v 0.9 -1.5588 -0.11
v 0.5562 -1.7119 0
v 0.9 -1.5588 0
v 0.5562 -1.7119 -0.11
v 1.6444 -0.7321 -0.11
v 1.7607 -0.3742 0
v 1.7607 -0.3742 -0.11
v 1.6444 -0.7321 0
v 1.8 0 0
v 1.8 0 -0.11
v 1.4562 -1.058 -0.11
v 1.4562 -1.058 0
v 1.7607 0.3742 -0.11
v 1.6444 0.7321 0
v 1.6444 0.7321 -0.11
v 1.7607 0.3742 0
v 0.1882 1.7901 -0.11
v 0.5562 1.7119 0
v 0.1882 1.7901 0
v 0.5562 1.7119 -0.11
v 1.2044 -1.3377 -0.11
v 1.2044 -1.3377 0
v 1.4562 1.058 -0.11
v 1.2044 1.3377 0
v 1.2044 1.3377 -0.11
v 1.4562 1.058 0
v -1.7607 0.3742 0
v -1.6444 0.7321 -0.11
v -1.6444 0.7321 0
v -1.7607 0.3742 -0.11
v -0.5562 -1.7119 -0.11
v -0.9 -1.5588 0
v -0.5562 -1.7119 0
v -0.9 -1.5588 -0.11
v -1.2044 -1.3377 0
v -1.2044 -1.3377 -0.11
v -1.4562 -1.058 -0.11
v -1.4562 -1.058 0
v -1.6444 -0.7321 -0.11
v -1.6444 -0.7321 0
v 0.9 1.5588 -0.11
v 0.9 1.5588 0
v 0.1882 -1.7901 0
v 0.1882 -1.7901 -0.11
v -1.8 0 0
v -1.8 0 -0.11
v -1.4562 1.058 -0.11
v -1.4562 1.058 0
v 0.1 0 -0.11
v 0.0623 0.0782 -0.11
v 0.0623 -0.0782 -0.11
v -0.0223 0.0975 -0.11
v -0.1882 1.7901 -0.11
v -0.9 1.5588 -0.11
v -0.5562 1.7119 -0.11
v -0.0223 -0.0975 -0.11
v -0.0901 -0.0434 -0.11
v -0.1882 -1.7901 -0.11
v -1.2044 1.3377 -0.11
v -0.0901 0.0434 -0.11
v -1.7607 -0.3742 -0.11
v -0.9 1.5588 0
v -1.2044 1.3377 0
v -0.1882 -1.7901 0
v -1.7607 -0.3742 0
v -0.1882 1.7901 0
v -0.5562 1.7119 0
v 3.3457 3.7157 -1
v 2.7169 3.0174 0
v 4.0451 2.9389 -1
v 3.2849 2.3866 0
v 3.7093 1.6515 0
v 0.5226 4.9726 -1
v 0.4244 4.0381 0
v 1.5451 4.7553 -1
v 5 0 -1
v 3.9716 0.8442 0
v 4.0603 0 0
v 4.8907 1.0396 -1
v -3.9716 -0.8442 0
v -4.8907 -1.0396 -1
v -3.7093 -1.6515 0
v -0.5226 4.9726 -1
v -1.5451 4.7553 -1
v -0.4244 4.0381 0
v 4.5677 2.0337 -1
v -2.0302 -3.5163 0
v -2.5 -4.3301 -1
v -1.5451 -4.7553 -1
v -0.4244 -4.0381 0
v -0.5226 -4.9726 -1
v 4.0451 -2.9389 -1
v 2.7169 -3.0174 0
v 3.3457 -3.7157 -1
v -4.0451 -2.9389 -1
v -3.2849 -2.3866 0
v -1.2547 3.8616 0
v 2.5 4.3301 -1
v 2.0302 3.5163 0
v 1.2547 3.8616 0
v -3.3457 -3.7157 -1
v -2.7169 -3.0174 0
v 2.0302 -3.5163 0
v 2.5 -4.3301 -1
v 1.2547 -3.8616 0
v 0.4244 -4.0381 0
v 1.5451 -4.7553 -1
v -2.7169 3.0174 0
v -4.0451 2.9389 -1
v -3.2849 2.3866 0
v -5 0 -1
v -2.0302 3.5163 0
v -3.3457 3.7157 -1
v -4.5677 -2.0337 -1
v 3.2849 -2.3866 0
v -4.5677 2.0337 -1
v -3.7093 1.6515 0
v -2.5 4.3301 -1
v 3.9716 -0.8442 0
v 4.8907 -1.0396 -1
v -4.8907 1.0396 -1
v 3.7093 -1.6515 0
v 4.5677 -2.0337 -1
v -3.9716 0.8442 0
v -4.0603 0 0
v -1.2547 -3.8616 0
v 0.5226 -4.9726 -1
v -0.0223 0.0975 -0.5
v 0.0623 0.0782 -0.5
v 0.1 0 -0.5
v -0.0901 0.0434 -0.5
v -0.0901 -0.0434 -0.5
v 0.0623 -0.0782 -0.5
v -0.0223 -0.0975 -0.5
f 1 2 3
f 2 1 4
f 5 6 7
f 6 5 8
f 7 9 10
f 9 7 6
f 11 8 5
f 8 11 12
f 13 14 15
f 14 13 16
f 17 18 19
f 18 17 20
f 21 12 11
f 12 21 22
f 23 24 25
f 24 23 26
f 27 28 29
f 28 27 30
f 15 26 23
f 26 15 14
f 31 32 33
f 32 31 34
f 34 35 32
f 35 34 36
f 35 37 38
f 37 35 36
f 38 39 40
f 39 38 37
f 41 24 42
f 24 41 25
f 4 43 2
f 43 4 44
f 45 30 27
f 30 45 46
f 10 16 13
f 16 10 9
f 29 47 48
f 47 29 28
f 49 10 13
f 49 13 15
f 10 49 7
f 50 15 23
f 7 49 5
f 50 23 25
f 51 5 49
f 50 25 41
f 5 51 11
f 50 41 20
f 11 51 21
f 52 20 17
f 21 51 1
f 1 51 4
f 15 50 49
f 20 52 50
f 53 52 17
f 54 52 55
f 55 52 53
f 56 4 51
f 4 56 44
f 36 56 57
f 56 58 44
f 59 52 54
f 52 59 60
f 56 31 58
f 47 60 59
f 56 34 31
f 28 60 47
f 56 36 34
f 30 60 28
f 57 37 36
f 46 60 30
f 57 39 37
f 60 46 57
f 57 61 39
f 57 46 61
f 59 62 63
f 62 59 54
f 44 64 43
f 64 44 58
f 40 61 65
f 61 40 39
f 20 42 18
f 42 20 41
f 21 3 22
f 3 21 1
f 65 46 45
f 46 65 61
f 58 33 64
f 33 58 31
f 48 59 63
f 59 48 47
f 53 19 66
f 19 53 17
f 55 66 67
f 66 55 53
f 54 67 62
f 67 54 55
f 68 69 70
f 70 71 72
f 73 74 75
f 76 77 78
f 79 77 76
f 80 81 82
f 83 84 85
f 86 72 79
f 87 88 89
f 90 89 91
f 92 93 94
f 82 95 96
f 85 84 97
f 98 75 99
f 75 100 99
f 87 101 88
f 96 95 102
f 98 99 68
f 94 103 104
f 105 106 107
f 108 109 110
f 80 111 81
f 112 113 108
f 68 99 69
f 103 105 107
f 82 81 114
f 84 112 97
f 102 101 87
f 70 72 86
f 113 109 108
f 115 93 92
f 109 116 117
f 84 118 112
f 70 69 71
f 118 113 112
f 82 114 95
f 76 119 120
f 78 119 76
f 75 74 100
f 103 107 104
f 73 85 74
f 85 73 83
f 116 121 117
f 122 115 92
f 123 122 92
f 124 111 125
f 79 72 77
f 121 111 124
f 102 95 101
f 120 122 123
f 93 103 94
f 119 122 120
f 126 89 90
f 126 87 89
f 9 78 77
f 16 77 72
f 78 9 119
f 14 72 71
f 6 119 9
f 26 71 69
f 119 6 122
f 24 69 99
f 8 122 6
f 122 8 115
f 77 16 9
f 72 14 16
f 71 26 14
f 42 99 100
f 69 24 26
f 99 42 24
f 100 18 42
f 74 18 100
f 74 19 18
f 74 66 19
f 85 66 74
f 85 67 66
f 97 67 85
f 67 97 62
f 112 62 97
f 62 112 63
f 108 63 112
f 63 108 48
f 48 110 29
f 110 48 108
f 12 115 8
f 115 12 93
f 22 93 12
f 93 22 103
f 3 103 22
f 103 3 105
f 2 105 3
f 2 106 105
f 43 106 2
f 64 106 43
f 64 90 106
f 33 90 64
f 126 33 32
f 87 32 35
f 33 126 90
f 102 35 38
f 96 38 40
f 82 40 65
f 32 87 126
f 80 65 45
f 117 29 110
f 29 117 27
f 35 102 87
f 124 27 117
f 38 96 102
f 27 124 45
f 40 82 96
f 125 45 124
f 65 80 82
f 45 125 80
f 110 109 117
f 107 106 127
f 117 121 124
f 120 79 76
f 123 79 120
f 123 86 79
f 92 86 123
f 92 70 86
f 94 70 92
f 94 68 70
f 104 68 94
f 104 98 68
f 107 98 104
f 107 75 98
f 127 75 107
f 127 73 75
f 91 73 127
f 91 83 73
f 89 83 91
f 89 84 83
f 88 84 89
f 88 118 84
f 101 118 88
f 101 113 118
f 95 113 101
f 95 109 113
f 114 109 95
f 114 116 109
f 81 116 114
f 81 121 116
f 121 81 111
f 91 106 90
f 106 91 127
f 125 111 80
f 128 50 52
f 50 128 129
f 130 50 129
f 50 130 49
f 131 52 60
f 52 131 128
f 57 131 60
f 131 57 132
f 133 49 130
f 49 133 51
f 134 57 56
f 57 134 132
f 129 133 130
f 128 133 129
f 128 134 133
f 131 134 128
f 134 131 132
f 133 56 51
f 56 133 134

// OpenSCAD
module paperMount(){
	width = 10;
	height = 1;
	taperdeg = 20;

	translate([0,0,-height])
	difference(){
		cylinder(h=height, d1=width, d2 = width - 2 * height * cos(taperdeg), center=false); //Marker for center
		translate([0,0,height/2]) cylinder(h=height, d=.2);
		translate([0,0,height-.1]) pinHole();
	}
}

axleD = 3;

clipHeight = .8;
clipRadius = 1.5;

module separatePin(axleLen = 3){
	rotate([180]) translate([0,0,-axleLen]){
		cylinder(h=axleLen, d=axleD);
		cylinder(h=clipHeight, d=axleD+2*clipRadius);
	}
}

module pinHole(axleLen = 3){
	rotate([180]) translate([0,0,-axleLen]){
		cylinder(h=axleLen + .01, d=axleD + 2*wiggle);
		translate([0,0,-.01]) cylinder(h=clipHeight + wiggle+.01, d=axleD+2*clipRadius + 2*wiggle);
	}
}

wiggle = .3;



$fs = .1;

color("lightgreen") {
	//	pivot(2);
	paperMount();
}
*color("lightgreen") translate([13,0]) {
	//	pivot(1);
	paperMount(axleLen=1);
}

*rotate([180]){
	separatePin();
	//	#pinHole();
}

// module peg(axleLen){ //peg, including clip
	// 	cylinder(d = axleD, h = axleLen);
	
	// 	clipHeight = .3;
	// 	clipRadius = .5;
	// 	translate([0,0,axleLen]) 
	// 	cylinder(h=clipHeight, d1=clipOuterD, d2=axleD);

	// 	clipOuterD = axleD+2*clipRadius;

	// 	printangle = 60;

	// 	translate([0,0,axleLen]) mirror([0,0,1]) cylinder(d1 = clipOuterD ,d2 = axleD, h = cos(printangle) * (clipOuterD - axleD));
	// }

	// module pivot(axleLen = 3){
		// 	difference(){ //Peg with slot
			// 		peg(axleLen);

			// 		sliceWidth = 2;
			// 		cube([100, sliceWidth, 100], center = true);
			// 	}
			// }
